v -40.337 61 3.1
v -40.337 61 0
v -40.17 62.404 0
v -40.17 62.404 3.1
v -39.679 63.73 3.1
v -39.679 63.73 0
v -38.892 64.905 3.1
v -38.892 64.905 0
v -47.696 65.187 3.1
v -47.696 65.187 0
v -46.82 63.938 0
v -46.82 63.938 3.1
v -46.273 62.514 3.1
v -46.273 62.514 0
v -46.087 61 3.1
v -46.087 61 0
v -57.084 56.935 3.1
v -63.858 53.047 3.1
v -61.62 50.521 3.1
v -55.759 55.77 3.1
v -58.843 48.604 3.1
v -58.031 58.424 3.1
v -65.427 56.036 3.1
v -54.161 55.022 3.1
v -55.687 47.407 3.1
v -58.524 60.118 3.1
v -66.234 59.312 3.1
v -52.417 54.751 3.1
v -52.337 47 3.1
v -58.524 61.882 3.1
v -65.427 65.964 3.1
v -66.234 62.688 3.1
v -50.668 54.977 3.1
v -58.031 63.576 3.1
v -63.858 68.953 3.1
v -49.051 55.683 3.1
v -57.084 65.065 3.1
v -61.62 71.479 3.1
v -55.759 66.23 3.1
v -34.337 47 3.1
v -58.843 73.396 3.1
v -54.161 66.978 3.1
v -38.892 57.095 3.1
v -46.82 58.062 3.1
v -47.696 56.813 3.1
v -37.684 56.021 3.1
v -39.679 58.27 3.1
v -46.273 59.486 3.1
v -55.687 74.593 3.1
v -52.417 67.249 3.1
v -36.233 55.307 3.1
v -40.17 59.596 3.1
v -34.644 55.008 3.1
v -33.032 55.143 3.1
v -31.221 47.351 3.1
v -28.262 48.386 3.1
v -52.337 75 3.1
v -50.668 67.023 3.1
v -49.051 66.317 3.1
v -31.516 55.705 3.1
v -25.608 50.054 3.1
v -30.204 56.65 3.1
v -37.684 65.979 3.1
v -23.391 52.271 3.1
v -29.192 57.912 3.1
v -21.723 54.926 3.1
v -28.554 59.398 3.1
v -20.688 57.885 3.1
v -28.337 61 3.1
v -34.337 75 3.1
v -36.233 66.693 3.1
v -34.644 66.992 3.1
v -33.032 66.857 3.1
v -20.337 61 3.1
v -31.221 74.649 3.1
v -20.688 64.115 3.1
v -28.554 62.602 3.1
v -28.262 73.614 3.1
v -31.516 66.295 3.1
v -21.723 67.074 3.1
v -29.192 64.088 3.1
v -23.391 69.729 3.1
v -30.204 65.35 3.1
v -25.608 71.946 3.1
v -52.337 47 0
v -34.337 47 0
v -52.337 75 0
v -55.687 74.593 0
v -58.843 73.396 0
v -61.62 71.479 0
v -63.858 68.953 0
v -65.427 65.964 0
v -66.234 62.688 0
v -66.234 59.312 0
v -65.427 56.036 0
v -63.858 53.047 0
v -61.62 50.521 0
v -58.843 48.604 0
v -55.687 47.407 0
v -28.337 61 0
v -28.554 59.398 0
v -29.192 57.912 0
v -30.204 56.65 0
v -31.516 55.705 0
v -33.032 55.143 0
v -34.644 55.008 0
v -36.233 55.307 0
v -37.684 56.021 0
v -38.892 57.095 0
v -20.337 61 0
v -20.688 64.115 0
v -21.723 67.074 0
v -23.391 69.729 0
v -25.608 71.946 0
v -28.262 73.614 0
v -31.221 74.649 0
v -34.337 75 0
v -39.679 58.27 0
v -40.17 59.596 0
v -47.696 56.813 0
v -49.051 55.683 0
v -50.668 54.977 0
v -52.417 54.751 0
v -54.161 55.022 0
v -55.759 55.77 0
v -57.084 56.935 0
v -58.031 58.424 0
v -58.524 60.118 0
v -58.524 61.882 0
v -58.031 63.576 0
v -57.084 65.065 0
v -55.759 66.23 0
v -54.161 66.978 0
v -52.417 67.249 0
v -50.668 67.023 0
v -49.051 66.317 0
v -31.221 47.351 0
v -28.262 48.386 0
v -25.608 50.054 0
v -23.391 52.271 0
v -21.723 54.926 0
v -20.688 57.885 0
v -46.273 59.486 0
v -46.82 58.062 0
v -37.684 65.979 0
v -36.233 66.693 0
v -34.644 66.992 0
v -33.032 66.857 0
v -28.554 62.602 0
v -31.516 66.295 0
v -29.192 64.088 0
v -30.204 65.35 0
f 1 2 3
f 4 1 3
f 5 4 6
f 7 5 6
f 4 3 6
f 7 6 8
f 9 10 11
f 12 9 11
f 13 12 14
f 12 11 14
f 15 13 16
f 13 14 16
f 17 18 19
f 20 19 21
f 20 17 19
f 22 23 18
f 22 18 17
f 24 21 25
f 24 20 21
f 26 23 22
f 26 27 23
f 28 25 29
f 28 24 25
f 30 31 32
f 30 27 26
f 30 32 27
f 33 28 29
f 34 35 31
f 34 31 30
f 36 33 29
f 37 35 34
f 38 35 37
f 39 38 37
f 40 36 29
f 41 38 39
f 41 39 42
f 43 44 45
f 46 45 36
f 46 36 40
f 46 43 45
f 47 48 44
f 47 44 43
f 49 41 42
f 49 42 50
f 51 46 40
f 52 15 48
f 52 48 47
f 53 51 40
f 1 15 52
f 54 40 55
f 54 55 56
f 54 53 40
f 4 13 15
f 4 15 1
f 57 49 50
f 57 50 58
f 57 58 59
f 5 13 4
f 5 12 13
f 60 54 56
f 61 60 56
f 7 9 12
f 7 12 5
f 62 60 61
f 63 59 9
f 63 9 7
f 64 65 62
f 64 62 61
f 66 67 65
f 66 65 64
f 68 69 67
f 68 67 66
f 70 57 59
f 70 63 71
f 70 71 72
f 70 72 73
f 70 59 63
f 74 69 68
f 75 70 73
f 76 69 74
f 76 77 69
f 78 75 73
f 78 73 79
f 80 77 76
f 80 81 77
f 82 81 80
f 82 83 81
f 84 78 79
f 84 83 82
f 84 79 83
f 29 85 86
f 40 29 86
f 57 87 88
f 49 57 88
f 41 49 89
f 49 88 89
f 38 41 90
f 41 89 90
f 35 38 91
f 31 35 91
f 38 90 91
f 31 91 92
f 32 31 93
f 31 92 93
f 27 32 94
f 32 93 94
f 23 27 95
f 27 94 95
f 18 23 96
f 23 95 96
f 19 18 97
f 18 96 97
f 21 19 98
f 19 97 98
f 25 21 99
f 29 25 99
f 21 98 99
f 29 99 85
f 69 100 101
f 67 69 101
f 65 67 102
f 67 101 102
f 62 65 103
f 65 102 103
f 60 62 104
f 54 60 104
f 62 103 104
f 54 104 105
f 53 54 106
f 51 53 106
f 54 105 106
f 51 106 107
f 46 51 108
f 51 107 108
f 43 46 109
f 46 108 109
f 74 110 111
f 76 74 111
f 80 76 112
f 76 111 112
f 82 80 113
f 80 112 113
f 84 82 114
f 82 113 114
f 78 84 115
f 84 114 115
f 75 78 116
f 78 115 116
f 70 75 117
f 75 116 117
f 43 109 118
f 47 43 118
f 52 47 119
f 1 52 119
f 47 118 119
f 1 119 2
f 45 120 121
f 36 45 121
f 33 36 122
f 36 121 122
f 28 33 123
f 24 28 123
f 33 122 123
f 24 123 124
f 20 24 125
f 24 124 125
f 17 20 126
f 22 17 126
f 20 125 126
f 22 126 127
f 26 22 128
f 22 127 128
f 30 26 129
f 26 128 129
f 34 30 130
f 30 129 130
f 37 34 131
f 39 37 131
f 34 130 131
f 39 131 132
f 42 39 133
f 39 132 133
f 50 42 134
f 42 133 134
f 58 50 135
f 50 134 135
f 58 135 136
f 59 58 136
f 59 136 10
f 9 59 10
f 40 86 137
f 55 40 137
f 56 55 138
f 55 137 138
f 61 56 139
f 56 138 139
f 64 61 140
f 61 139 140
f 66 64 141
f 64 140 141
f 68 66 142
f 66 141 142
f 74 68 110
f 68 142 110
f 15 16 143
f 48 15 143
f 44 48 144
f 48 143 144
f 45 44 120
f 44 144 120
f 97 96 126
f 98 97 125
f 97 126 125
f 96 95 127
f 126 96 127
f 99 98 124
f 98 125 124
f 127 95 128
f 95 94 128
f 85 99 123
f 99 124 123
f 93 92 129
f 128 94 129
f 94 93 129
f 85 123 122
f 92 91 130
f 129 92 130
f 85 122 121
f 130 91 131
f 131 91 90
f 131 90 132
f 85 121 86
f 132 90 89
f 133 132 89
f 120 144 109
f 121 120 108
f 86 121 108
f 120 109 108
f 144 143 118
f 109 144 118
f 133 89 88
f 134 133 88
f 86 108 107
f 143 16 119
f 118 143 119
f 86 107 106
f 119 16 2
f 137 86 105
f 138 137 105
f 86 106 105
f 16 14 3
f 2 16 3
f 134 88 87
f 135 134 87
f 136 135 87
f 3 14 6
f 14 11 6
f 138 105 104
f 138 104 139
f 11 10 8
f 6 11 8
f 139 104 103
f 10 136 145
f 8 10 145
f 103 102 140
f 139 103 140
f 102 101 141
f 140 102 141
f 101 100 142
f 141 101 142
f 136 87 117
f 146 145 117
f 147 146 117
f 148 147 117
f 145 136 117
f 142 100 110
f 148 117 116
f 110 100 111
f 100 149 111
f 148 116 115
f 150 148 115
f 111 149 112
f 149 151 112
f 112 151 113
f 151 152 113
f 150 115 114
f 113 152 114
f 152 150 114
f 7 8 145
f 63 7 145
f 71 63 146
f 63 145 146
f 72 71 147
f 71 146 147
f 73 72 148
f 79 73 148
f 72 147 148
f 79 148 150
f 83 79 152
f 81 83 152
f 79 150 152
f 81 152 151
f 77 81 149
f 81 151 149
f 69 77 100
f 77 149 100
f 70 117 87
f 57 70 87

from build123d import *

# Parameters (mm, degrees)
F1_DEPTH = 3.1
F2_DEPTH = 3.1


# Not quite as in the source:
# - a feature names something its author has since deleted; it is built from what else it names


with BuildPart() as f1:
    # F0 (on Top) → F1 (new body)
    with BuildSketch(Plane.XY):
        with BuildLine():
            ThreePointArc((-38.8921249823, 64.9047296424), (-32.2549034273, 66.6273143387), (-28.3365694268, 61))
            ThreePointArc((-28.3365694268, 61), (-32.2549034273, 55.3726856613), (-38.8921249823, 57.0952703576))
            ThreePointArc((-38.8921249823, 57.0952703576), (-40.607834636, 53.3556046539), (-43.3365694268, 50.2761947052))
            ThreePointArc((-43.3365694268, 50.2761947052), (-39.1254485166, 47.8445206449), (-34.3365694268, 47))
            ThreePointArc((-34.3365694268, 47), (-24.4370744902, 51.1005050634), (-20.3365694268, 61))
            ThreePointArc((-20.3365694268, 61), (-24.4370744902, 70.8994949366), (-34.3365694268, 75))
            ThreePointArc((-34.3365694268, 75), (-39.1254485166, 74.1554793551), (-43.3365694268, 71.7238052948))
            ThreePointArc((-43.3365694268, 71.7238052948), (-40.607834636, 68.6443953461), (-38.8921249823, 64.9047296424))
        make_face()
        with BuildLine():
            ThreePointArc((-52.3365694268, 75), (-47.547690337, 74.1554793551), (-43.3365694268, 71.7238052948))
            ThreePointArc((-43.3365694268, 71.7238052948), (-39.1254485166, 74.1554793551), (-34.3365694268, 75))
            Line((-34.3365694268, 75), (-52.3365694268, 75))
        make_face()
        with BuildLine():
            ThreePointArc((-47.6959444268, 65.1865379025), (-45.9842893254, 68.7672788776), (-43.3365694268, 71.7238052948))
            ThreePointArc((-43.3365694268, 71.7238052948), (-47.547690337, 74.1554793551), (-52.3365694268, 75))
            ThreePointArc((-52.3365694268, 75), (-66.3365694268, 61), (-52.3365694268, 47))
            ThreePointArc((-52.3365694268, 47), (-47.547690337, 47.8445206449), (-43.3365694268, 50.2761947052))
            ThreePointArc((-43.3365694268, 50.2761947052), (-45.9842893254, 53.2327211224), (-47.6959444268, 56.8134620975))
            ThreePointArc((-47.6959444268, 56.8134620975), (-58.5865694268, 61), (-47.6959444268, 65.1865379025))
        make_face()
        with BuildLine():
            ThreePointArc((-34.3365694268, 47), (-39.1254485166, 47.8445206449), (-43.3365694268, 50.2761947052))
            ThreePointArc((-43.3365694268, 50.2761947052), (-47.547690337, 47.8445206449), (-52.3365694268, 47))
            Line((-52.3365694268, 47), (-34.3365694268, 47))
        make_face()
        with BuildLine():
            ThreePointArc((-40.3365694268, 61), (-39.9638837655, 63.0816659995), (-38.8921249823, 64.9047296424))
            ThreePointArc((-38.8921249823, 64.9047296424), (-40.607834636, 68.6443953461), (-43.3365694268, 71.7238052948))
            ThreePointArc((-43.3365694268, 71.7238052948), (-45.9842893254, 68.7672788776), (-47.6959444268, 65.1865379025))
            ThreePointArc((-47.6959444268, 65.1865379025), (-46.5027710822, 63.2426093898), (-46.0865694268, 61))
            Line((-46.0865694268, 61), (-40.3365694268, 61))
        make_face()
        with BuildLine():
            ThreePointArc((-43.3365694268, 50.2761947052), (-40.607834636, 53.3556046539), (-38.8921249823, 57.0952703576))
            ThreePointArc((-38.8921249823, 57.0952703576), (-39.9638837655, 58.9183340005), (-40.3365694268, 61))
            Line((-40.3365694268, 61), (-46.0865694268, 61))
            ThreePointArc((-46.0865694268, 61), (-46.5027710822, 58.7573906102), (-47.6959444268, 56.8134620975))
            ThreePointArc((-47.6959444268, 56.8134620975), (-45.9842893254, 53.2327211224), (-43.3365694268, 50.2761947052))
        make_face()
    extrude(amount=F1_DEPTH)

    # F0 (on Top) → F2 (join)
    with BuildSketch(Plane.XY):
        with BuildLine():
            ThreePointArc((-38.8921249823, 64.9047296424), (-32.2549034273, 66.6273143387), (-28.3365694268, 61))
            ThreePointArc((-28.3365694268, 61), (-32.2549034273, 55.3726856613), (-38.8921249823, 57.0952703576))
            ThreePointArc((-38.8921249823, 57.0952703576), (-40.607834636, 53.3556046539), (-43.3365694268, 50.2761947052))
            ThreePointArc((-43.3365694268, 50.2761947052), (-39.1254485166, 47.8445206449), (-34.3365694268, 47))
            ThreePointArc((-34.3365694268, 47), (-24.4370744902, 51.1005050634), (-20.3365694268, 61))
            ThreePointArc((-20.3365694268, 61), (-24.4370744902, 70.8994949366), (-34.3365694268, 75))
            ThreePointArc((-34.3365694268, 75), (-39.1254485166, 74.1554793551), (-43.3365694268, 71.7238052948))
            ThreePointArc((-43.3365694268, 71.7238052948), (-40.607834636, 68.6443953461), (-38.8921249823, 64.9047296424))
        make_face()
        with BuildLine():
            ThreePointArc((-52.3365694268, 75), (-47.547690337, 74.1554793551), (-43.3365694268, 71.7238052948))
            ThreePointArc((-43.3365694268, 71.7238052948), (-39.1254485166, 74.1554793551), (-34.3365694268, 75))
            Line((-34.3365694268, 75), (-52.3365694268, 75))
        make_face()
        with BuildLine():
            ThreePointArc((-47.6959444268, 65.1865379025), (-45.9842893254, 68.7672788776), (-43.3365694268, 71.7238052948))
            ThreePointArc((-43.3365694268, 71.7238052948), (-47.547690337, 74.1554793551), (-52.3365694268, 75))
            ThreePointArc((-52.3365694268, 75), (-66.3365694268, 61), (-52.3365694268, 47))
            ThreePointArc((-52.3365694268, 47), (-47.547690337, 47.8445206449), (-43.3365694268, 50.2761947052))
            ThreePointArc((-43.3365694268, 50.2761947052), (-45.9842893254, 53.2327211224), (-47.6959444268, 56.8134620975))
            ThreePointArc((-47.6959444268, 56.8134620975), (-58.5865694268, 61), (-47.6959444268, 65.1865379025))
        make_face()
        with BuildLine():
            ThreePointArc((-34.3365694268, 47), (-39.1254485166, 47.8445206449), (-43.3365694268, 50.2761947052))
            ThreePointArc((-43.3365694268, 50.2761947052), (-47.547690337, 47.8445206449), (-52.3365694268, 47))
            Line((-52.3365694268, 47), (-34.3365694268, 47))
        make_face()
    extrude(amount=F2_DEPTH)


solid = f1.part
